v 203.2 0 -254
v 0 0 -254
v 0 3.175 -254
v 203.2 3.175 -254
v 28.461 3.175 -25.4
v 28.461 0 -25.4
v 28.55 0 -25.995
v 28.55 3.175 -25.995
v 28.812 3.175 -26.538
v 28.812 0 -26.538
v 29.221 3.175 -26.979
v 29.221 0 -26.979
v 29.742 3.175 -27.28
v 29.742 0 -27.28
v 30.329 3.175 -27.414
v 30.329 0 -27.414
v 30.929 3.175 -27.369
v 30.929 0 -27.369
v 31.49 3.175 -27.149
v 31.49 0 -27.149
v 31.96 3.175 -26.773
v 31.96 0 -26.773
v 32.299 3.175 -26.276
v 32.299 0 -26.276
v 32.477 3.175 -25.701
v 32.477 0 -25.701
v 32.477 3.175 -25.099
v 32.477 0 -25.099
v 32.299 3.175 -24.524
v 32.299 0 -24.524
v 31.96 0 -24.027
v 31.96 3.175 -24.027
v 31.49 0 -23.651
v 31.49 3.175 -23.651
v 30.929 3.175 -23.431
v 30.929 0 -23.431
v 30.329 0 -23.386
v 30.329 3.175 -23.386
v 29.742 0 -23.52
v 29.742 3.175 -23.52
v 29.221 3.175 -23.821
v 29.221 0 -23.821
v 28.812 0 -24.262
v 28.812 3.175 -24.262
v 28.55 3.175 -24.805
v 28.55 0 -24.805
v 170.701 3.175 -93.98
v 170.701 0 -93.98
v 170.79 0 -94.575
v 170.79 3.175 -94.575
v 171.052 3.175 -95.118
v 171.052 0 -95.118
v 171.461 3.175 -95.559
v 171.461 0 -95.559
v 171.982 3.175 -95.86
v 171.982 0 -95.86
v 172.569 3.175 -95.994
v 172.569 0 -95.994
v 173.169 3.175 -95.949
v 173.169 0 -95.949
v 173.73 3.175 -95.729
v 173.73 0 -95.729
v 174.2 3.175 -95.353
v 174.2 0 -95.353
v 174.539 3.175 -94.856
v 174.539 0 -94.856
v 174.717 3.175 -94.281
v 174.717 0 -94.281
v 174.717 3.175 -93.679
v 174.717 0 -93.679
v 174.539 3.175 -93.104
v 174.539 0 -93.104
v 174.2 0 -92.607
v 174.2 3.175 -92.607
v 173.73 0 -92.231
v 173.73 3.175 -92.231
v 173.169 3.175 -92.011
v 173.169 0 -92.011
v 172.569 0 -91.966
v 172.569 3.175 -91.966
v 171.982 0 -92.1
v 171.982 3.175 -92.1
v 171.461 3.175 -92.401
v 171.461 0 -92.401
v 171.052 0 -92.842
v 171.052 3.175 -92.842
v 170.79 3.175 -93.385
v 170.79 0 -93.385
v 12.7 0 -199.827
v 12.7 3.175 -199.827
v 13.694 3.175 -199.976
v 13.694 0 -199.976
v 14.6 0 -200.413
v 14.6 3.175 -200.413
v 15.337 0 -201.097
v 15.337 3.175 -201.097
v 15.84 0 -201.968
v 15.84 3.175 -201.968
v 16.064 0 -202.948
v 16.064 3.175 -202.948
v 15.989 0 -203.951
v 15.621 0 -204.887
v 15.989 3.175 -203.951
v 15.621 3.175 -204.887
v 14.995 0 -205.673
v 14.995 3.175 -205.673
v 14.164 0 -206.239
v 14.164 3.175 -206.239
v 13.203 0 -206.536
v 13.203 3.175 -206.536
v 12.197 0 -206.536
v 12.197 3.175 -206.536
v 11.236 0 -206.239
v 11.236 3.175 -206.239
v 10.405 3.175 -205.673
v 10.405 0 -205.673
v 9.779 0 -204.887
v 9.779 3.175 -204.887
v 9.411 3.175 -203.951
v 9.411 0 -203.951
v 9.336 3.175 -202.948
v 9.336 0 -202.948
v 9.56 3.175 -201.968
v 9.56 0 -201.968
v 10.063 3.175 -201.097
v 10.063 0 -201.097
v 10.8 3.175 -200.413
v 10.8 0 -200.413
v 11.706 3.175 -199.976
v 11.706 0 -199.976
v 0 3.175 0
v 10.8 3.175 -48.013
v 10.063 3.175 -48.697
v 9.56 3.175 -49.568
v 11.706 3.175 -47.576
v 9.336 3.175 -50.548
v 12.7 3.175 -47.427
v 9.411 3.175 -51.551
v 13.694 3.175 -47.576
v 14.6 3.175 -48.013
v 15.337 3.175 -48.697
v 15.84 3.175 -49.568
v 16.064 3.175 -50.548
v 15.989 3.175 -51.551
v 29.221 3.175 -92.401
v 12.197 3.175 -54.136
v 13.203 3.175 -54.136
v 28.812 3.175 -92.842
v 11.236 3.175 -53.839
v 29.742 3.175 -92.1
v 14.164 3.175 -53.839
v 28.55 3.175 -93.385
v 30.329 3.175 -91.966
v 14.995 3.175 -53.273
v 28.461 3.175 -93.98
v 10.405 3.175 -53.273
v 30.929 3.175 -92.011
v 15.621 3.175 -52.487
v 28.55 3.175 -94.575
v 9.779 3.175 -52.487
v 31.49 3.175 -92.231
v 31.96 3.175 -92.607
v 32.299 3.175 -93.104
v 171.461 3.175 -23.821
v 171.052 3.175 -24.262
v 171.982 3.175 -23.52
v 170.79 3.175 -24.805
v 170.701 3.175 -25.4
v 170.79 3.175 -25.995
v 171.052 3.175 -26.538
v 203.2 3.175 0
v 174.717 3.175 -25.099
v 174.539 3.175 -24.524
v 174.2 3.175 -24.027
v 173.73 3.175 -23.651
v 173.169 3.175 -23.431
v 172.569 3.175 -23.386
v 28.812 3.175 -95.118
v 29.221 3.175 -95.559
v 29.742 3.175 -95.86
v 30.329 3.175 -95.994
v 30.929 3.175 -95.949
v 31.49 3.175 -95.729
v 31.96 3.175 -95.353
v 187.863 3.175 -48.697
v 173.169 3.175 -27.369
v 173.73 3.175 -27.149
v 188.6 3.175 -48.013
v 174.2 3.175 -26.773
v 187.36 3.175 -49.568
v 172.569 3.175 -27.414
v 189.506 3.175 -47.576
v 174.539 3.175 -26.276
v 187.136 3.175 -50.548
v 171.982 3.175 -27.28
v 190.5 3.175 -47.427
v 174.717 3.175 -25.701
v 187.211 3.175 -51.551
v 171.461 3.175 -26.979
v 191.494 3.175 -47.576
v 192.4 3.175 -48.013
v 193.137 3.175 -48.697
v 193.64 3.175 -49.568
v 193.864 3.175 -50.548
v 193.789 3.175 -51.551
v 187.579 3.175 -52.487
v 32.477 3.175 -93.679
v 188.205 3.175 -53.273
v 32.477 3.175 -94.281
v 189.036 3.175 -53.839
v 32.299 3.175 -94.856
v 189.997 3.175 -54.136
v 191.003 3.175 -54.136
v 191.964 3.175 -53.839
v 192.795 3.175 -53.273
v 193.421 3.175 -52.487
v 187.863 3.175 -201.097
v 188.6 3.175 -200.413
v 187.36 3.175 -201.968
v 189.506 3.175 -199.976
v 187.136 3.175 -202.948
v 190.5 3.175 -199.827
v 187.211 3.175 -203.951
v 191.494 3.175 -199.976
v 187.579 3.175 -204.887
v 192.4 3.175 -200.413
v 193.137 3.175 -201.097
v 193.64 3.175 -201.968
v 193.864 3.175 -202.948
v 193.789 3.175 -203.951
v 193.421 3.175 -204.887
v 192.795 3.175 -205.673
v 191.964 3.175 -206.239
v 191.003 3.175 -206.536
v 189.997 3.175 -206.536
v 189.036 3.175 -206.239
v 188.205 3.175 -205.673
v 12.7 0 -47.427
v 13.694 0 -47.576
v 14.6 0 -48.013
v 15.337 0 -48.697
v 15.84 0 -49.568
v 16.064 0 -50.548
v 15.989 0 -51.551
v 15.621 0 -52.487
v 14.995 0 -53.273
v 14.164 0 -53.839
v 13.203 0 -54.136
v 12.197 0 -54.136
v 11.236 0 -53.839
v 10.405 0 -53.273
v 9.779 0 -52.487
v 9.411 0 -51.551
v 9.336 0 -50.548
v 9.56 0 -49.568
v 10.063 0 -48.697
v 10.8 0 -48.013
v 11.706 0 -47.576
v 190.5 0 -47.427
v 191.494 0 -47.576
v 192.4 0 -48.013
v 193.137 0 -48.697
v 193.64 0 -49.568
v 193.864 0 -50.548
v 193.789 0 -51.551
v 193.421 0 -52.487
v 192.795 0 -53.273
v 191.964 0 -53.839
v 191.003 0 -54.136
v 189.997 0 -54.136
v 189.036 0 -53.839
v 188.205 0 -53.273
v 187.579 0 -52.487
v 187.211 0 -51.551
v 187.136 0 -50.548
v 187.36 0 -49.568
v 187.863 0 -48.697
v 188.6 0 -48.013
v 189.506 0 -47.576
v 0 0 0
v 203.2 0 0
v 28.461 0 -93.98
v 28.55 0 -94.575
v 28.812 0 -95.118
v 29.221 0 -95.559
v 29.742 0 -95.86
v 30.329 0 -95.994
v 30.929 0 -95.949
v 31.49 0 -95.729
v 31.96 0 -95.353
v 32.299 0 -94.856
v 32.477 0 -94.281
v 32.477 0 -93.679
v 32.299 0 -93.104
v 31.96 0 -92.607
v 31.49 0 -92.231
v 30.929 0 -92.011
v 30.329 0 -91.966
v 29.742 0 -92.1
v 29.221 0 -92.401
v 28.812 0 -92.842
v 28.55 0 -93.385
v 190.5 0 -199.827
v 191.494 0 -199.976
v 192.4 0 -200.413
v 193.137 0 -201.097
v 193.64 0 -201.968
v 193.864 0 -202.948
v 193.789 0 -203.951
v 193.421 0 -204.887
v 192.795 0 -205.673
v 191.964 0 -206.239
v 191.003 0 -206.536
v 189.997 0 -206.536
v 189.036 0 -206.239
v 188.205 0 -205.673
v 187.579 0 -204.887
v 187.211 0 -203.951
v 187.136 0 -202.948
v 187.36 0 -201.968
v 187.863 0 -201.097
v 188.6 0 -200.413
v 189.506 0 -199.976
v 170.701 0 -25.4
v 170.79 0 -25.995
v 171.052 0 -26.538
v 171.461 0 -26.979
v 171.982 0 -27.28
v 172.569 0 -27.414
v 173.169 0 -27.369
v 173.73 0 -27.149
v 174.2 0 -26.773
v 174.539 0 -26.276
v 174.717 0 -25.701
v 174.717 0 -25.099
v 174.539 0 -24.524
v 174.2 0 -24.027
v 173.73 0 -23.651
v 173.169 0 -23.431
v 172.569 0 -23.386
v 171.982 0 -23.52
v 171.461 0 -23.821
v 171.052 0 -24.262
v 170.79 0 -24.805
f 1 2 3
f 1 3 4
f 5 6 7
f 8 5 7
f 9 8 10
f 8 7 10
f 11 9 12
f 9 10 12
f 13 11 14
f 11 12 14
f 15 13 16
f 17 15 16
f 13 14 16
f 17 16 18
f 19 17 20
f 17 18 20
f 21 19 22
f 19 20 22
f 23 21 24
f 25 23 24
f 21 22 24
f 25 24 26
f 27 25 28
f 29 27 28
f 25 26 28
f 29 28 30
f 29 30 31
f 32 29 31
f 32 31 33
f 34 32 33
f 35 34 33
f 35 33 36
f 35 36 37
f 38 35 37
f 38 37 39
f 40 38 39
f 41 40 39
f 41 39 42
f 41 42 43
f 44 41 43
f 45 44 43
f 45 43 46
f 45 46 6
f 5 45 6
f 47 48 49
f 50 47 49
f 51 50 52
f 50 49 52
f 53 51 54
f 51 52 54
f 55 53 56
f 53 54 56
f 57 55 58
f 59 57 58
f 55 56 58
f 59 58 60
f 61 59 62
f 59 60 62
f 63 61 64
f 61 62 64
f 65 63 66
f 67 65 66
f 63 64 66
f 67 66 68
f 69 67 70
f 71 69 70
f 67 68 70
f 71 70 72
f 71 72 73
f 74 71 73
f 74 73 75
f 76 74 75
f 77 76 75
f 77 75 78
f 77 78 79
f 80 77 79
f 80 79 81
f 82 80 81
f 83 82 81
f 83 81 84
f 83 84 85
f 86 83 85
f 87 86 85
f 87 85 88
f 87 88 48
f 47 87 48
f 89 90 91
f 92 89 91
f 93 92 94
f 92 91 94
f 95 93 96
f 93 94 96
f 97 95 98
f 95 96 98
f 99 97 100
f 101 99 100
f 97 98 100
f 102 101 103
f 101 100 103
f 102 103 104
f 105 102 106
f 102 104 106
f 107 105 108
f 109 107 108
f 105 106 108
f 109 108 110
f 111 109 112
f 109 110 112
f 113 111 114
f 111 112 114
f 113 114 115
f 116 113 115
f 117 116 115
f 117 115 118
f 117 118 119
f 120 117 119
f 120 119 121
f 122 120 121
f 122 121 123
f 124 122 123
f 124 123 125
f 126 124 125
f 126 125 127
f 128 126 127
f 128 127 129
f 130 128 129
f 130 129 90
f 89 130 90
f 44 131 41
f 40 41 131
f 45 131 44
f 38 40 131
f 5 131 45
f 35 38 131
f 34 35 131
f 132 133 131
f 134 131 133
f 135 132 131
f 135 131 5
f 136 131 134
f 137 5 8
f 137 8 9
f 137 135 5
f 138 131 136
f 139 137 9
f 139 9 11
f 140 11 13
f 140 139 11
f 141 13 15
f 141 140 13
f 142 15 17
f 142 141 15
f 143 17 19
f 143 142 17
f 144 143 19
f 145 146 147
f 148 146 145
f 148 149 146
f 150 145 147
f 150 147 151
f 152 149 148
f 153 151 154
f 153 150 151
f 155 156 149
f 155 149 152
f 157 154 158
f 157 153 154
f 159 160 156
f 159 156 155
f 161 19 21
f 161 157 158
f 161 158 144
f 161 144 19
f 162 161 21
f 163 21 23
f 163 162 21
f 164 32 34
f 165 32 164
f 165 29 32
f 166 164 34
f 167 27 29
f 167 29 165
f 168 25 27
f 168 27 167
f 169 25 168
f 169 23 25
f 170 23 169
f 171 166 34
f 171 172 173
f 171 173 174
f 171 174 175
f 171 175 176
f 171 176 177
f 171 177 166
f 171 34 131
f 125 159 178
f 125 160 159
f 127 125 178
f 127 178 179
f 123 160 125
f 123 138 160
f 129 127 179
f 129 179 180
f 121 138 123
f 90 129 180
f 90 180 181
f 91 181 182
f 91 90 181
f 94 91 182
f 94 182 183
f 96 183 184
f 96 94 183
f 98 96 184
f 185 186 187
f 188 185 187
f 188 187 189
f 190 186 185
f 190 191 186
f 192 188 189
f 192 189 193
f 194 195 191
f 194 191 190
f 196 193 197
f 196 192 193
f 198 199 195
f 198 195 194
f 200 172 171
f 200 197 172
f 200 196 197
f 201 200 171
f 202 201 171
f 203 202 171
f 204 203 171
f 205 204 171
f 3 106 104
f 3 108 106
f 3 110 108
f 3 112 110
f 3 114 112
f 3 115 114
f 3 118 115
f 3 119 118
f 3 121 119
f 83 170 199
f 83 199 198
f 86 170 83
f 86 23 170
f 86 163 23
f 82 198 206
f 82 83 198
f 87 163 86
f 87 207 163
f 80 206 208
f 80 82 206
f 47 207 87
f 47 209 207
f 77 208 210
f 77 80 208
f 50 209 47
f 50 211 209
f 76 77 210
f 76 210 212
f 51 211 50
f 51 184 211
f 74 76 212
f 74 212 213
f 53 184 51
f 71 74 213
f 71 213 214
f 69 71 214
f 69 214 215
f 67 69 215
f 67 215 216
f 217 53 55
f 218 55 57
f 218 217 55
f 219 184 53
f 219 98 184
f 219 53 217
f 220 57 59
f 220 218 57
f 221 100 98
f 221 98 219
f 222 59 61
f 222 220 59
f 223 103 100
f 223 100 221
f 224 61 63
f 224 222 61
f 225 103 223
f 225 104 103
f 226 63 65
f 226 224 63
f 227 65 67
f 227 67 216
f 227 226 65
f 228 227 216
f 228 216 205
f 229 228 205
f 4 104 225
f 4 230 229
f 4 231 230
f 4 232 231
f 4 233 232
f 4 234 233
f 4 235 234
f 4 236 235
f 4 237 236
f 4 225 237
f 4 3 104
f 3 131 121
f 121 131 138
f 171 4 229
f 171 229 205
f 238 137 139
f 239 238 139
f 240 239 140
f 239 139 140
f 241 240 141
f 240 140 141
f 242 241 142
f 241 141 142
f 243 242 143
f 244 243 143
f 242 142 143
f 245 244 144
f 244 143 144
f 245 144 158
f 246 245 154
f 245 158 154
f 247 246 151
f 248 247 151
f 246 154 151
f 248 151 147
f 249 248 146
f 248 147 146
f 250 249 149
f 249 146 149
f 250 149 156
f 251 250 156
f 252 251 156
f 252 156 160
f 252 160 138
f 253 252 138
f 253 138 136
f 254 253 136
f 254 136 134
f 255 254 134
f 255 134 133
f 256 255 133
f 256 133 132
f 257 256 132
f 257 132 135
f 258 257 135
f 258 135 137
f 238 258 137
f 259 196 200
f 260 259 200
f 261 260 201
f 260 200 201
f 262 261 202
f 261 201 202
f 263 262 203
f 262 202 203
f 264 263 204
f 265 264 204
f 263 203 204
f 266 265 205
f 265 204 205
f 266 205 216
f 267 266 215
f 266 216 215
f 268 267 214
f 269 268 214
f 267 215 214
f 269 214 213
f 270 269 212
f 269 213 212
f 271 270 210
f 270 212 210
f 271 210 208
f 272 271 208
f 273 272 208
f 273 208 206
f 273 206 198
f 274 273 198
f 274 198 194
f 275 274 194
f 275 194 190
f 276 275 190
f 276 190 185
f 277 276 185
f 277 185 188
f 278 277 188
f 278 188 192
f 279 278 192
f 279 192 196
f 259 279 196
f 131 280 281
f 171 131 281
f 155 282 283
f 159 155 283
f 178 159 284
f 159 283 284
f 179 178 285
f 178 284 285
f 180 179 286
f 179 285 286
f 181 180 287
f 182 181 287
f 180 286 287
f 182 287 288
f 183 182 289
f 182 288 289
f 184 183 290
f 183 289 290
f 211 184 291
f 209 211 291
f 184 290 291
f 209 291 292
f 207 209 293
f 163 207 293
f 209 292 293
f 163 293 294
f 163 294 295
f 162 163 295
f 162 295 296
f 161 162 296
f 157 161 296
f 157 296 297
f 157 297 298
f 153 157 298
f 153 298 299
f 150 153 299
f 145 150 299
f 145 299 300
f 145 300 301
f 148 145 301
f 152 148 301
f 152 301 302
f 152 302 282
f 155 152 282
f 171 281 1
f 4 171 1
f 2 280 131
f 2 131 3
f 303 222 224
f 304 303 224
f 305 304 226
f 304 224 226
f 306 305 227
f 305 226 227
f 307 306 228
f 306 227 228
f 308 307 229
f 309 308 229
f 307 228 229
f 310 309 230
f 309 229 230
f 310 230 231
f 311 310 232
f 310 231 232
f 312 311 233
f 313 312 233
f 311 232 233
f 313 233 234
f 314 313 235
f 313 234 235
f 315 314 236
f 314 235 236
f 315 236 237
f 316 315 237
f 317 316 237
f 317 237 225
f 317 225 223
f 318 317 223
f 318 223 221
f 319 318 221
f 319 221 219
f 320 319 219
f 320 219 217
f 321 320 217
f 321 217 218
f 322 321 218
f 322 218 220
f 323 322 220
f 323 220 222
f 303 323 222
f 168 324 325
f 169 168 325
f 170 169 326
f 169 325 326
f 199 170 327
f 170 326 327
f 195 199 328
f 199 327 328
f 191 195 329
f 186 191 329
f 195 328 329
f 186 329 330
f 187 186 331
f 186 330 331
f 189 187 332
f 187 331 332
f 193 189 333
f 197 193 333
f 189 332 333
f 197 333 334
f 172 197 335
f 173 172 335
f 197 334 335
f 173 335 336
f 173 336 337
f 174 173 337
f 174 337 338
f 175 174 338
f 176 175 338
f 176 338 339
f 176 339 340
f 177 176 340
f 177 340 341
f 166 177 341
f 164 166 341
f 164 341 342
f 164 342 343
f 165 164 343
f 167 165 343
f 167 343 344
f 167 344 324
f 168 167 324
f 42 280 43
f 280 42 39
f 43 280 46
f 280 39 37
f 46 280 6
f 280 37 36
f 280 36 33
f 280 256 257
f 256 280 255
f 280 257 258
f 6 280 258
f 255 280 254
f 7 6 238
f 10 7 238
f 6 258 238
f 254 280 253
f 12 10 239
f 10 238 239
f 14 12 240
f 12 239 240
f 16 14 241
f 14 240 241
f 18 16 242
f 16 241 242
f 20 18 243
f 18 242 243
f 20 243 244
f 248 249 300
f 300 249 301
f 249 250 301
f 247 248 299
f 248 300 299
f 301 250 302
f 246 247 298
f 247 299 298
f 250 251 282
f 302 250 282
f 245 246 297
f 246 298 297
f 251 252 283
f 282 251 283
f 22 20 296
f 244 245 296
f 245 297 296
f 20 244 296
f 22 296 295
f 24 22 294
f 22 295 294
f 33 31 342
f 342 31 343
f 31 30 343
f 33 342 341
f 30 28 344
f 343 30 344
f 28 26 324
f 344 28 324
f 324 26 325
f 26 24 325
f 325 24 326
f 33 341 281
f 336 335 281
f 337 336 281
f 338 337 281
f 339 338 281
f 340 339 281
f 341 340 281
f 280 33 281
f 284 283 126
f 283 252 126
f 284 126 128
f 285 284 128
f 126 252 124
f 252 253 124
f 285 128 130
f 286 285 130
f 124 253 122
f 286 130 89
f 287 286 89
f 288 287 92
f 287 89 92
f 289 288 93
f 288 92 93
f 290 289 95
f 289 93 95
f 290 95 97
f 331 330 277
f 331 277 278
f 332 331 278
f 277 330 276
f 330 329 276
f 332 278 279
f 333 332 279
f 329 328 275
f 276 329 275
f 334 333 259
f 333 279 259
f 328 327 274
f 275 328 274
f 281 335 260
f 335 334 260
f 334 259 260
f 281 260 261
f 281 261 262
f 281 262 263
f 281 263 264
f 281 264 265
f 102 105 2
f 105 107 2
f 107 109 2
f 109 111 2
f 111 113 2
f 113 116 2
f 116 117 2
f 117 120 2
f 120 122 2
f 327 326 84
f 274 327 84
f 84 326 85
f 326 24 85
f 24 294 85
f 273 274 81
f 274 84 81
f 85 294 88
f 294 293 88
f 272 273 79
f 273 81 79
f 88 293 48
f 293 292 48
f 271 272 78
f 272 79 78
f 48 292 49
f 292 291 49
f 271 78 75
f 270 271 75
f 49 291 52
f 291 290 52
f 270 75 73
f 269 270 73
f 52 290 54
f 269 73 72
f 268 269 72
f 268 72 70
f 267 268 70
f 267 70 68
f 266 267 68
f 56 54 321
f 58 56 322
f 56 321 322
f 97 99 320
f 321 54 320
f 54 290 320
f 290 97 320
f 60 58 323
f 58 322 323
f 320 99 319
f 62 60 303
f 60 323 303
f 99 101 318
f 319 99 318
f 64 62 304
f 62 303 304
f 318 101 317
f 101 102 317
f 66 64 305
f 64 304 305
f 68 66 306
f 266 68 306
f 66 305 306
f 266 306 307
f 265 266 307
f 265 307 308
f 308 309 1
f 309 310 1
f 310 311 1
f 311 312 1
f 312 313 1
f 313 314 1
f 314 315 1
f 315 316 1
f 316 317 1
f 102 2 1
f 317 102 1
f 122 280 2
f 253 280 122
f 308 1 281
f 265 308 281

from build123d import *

# Parameters (mm, degrees)
SKETCH1_W              = 203.2
SKETCH1_H              = 254
BOSS_EXTRUDE1_DEPTH    = 3.175
SKETCH2_R              = 3.3734375
CUT_EXTRUDE1_DEPTH     = 326.294206258
F_10_32_TAPPED_HOLE1_D = 4.0386


with BuildPart() as part:
    # Sketch1 → Boss-Extrude1 (new body)
    with BuildSketch(Plane(origin=(0, 0, 0), x_dir=(1, 0, 0), z_dir=(0, 1, 0))):
        with Locations((101.6, 127)):
            Rectangle(SKETCH1_W, SKETCH1_H)
    extrude(amount=BOSS_EXTRUDE1_DEPTH)

    # Sketch2 → Cut-Extrude1 (cut, through all)
    with BuildSketch(Plane(origin=(0, 3.175, 0), x_dir=(1, 0, 0), z_dir=(0, 1, 0))):
        with Locations(Location((190.5, 203.2, 0), (0, 0, 270))):
            Circle(SKETCH2_R)
        with Locations(Location((12.7, 203.2, 0), (0, 0, 270))):
            Circle(SKETCH2_R)
        with Locations(Location((12.7, 50.8, 0), (0, 0, 270))):
            Circle(SKETCH2_R)
        with Locations(Location((190.5, 50.8, 0), (0, 0, 270))):
            Circle(SKETCH2_R)
    extrude(amount=-CUT_EXTRUDE1_DEPTH, mode=Mode.SUBTRACT)

    # #10-32 Tapped Hole1 (through all)
    with Locations(Plane(origin=(0, 3.175, 0), x_dir=(1, 0, 0), z_dir=(0, 1, 0))):
        with Locations((172.72, 25.4), (172.72, 93.98), (30.48, 25.4), (30.48, 93.98)):
            Hole(F_10_32_TAPPED_HOLE1_D / 2)


solid = part.part
